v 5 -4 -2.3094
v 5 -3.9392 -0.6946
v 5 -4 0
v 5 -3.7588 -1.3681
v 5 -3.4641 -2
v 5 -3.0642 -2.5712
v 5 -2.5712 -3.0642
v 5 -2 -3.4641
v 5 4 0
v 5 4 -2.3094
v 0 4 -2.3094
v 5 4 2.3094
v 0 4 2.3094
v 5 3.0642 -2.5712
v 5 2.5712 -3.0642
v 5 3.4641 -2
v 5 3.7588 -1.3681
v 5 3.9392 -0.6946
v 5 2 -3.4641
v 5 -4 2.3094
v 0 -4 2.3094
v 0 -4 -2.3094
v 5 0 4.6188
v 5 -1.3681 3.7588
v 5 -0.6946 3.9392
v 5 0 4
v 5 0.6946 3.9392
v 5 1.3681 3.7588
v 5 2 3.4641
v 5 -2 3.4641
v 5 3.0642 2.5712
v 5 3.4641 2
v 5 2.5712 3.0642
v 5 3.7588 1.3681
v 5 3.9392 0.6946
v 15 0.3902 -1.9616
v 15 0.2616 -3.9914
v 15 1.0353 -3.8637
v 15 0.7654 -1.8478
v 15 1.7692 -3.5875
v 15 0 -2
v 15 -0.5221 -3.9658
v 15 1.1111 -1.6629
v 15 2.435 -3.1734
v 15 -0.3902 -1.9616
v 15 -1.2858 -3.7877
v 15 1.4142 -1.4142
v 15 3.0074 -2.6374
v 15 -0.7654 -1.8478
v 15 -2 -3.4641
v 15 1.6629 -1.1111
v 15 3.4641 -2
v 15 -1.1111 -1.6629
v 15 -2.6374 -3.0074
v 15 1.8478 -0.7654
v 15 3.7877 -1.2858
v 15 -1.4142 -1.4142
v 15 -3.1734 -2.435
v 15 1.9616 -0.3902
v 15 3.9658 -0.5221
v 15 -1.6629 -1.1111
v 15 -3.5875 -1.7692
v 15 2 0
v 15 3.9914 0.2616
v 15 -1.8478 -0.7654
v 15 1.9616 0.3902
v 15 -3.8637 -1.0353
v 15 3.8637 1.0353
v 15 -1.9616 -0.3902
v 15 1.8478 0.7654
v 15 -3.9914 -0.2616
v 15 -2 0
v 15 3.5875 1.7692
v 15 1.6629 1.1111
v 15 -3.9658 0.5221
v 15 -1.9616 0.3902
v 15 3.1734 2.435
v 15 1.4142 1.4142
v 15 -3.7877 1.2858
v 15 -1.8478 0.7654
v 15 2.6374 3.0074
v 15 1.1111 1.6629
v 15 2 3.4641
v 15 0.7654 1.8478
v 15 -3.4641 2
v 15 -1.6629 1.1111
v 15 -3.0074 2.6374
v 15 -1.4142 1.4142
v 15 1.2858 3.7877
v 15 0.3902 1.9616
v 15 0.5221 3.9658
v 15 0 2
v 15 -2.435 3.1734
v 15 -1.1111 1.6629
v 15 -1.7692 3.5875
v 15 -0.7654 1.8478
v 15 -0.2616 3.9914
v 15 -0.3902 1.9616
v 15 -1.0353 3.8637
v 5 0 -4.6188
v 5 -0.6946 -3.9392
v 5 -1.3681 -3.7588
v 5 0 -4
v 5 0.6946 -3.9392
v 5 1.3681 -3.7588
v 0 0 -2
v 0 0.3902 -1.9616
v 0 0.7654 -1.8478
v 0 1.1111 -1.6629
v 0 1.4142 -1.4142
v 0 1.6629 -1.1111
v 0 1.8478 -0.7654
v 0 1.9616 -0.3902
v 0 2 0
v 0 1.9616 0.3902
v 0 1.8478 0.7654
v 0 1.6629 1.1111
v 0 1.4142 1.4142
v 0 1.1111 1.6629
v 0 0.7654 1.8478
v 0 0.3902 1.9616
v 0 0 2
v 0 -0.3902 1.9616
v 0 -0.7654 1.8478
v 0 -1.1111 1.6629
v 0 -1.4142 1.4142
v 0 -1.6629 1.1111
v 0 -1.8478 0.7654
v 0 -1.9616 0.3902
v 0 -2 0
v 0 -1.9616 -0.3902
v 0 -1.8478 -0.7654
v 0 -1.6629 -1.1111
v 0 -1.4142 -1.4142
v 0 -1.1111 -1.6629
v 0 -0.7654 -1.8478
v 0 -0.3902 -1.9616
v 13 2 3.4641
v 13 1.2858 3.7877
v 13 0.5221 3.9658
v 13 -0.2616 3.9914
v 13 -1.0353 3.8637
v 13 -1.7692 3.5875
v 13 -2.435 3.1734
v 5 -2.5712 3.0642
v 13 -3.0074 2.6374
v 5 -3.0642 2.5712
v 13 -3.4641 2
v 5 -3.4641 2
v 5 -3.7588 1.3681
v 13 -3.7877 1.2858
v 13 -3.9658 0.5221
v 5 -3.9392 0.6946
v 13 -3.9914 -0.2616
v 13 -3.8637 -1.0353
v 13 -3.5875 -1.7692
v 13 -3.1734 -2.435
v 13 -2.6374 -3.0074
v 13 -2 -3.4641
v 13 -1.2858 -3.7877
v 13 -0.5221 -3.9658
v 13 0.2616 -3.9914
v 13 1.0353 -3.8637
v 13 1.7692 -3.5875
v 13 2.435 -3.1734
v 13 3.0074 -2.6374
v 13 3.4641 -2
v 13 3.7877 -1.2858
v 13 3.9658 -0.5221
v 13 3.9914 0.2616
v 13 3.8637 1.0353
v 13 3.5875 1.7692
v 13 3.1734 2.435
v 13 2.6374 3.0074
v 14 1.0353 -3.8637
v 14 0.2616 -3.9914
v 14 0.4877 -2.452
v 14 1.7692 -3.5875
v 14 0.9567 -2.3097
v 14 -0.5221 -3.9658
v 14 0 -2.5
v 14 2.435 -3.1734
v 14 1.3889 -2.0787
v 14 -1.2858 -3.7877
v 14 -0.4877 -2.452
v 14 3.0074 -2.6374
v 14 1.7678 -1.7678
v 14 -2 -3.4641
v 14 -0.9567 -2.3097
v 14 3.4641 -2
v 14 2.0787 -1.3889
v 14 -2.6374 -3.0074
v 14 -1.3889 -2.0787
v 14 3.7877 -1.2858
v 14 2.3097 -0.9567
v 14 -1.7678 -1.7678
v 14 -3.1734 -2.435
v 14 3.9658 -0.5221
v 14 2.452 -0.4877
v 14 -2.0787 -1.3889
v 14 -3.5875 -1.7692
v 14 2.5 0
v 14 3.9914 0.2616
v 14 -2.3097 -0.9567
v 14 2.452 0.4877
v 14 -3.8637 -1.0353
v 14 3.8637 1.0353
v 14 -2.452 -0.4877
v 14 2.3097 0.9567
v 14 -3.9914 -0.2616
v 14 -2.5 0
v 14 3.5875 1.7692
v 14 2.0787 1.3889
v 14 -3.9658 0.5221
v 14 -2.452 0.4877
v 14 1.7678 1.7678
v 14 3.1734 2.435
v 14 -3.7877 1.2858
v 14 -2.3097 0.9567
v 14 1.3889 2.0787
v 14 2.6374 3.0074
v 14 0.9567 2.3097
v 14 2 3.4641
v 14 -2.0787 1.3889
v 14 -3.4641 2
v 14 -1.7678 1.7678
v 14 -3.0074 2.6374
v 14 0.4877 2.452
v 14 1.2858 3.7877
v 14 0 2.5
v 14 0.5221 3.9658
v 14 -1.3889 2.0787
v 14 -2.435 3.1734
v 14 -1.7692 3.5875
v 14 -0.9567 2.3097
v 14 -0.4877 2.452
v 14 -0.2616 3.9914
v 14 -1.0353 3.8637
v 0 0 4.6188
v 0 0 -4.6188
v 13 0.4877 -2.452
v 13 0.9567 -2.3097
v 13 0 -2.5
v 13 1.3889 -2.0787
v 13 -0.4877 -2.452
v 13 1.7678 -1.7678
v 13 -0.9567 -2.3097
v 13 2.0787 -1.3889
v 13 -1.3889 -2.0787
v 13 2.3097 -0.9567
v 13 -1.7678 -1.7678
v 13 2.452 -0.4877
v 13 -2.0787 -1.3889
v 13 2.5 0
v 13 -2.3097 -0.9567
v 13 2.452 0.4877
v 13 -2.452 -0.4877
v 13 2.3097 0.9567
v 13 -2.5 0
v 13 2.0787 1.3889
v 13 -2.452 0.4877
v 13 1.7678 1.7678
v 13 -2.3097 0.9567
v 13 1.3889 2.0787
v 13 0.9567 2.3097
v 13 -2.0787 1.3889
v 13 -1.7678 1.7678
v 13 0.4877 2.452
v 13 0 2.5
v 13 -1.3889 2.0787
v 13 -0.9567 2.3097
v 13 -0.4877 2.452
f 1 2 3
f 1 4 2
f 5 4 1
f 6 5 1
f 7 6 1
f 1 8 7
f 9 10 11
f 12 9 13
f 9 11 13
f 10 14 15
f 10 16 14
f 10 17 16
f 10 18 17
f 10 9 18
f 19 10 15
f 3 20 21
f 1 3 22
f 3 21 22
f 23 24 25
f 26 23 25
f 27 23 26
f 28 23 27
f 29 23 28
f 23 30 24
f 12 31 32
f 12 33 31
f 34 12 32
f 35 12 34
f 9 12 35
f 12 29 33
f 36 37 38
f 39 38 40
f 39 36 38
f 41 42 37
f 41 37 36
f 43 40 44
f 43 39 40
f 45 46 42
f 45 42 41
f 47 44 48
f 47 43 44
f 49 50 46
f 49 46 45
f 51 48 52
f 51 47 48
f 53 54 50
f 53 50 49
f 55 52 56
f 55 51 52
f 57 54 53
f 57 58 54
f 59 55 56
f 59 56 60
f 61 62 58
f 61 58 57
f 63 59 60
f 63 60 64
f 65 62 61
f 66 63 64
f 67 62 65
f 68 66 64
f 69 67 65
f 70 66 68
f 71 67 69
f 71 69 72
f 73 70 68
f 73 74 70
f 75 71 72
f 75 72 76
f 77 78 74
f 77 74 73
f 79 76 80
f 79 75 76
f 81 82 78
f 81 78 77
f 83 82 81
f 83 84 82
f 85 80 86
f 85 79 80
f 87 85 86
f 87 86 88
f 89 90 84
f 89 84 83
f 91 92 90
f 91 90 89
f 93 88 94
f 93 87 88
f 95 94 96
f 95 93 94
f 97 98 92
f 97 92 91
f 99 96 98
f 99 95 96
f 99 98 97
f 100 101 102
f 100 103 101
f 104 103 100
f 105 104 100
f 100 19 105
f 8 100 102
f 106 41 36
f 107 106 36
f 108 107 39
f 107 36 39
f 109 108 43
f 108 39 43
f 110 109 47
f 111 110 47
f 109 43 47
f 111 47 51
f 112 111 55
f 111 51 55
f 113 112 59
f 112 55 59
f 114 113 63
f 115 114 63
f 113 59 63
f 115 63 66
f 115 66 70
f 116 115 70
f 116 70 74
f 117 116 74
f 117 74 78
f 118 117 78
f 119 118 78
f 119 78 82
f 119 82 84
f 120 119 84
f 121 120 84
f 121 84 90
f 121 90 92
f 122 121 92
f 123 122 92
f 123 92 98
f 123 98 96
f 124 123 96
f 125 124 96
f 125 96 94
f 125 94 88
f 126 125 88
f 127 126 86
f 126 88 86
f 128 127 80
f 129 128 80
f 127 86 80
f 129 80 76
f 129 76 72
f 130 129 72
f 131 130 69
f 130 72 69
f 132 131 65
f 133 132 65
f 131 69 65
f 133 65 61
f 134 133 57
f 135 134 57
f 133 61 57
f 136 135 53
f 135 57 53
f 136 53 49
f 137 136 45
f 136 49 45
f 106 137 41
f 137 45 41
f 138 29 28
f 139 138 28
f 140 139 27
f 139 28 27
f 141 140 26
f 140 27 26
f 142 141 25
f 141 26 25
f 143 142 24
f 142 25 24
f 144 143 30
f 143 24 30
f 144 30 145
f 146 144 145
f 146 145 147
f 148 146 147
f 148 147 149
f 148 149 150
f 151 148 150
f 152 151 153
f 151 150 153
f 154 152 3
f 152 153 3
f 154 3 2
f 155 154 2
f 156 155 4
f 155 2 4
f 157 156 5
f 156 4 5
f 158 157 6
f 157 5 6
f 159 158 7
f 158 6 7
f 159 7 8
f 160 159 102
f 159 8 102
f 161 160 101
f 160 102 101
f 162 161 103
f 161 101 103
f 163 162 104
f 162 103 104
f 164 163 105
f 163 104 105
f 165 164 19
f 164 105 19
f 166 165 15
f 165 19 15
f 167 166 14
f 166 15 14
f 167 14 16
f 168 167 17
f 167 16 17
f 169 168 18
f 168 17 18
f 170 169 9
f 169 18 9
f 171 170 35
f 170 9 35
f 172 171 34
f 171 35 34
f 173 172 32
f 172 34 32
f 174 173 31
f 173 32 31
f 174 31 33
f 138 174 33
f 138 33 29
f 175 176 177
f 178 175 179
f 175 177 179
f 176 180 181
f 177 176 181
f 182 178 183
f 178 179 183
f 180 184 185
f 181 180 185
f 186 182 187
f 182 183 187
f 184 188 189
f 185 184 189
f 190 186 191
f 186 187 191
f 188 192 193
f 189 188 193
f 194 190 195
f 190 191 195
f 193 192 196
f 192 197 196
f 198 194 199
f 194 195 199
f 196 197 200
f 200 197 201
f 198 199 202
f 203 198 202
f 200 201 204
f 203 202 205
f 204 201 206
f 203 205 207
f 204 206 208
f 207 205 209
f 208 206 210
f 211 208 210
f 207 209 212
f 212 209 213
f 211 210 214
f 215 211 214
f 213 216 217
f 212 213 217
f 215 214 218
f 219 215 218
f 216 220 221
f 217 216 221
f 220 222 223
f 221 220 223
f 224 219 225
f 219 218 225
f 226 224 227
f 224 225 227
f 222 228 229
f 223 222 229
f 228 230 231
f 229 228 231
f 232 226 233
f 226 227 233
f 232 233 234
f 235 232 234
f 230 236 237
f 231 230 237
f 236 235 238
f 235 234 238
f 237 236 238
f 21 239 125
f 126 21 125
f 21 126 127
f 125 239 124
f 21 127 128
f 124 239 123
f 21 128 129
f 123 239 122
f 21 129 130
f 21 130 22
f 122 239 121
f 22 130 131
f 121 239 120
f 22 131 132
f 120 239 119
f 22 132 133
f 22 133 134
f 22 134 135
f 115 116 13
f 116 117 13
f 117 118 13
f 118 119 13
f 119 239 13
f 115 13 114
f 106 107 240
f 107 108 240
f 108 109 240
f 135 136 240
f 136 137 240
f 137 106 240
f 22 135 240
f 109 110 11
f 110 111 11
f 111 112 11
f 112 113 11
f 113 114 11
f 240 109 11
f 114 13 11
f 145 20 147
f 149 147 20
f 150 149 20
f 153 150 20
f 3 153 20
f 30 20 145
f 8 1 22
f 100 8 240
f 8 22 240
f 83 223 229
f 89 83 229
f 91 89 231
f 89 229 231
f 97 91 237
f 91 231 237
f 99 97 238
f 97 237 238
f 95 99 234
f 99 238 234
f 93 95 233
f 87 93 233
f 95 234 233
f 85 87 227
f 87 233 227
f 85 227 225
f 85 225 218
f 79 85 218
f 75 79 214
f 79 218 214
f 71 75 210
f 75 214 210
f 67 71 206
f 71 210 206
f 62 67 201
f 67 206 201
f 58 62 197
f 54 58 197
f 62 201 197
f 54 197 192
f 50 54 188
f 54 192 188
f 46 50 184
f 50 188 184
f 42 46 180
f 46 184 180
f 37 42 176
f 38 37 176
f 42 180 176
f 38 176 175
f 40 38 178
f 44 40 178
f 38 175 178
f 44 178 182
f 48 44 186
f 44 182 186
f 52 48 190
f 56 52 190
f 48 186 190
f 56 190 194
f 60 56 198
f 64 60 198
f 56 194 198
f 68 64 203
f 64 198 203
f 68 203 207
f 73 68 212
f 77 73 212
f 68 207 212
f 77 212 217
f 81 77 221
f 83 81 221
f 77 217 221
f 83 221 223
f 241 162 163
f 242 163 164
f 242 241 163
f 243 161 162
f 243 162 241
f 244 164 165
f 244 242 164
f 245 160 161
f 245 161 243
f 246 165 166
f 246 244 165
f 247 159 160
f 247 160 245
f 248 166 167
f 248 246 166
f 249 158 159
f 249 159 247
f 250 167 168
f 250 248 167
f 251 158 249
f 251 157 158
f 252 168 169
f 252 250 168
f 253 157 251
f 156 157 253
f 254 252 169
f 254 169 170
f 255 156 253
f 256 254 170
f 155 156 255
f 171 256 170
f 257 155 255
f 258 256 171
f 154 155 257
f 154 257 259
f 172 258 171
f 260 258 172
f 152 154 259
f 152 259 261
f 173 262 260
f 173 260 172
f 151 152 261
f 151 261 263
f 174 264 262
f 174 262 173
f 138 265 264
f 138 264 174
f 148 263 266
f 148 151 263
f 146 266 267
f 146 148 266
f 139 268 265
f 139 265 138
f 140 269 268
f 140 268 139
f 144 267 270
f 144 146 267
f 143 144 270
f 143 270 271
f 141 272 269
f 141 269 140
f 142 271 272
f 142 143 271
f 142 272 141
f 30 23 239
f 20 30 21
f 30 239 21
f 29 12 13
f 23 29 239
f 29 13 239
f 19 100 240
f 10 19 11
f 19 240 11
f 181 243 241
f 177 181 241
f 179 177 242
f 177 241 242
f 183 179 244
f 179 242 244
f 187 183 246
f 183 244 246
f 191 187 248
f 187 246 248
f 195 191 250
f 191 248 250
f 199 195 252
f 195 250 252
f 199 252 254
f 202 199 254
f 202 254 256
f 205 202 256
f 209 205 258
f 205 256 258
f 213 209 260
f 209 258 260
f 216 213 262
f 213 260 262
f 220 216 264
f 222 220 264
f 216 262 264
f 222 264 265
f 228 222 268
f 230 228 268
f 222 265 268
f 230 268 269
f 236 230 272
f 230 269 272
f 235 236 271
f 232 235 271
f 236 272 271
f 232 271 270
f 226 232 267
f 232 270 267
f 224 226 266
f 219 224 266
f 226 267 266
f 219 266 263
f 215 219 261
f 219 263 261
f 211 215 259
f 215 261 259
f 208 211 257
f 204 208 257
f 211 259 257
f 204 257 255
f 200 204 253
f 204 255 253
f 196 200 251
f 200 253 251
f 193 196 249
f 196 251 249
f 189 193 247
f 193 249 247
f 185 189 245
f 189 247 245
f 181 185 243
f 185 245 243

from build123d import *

# Parameters (mm, degrees)
EXTRUDE_1_DEPTH     = 5
SKETCH_2_R          = 4
EXTRUDE_2_DEPTH     = 8
SKETCH_3_R          = 2.5
EXTRUDE_3_DEPTH     = 1
SKETCH_4_R          = 4
EXTRUDE_4_DEPTH     = 1
SKETCH_5_R          = 2
CUT_EXTRUDE_1_DEPTH = 17.196707484


with BuildPart() as part:
    # 草图1 → 凸台-拉伸1 (new body)
    with BuildSketch(Plane(origin=(0, 0, 0), x_dir=(0, 0, -1), z_dir=(1, 0, 0))):
        Polygon((-2.309401077, 4), (-4.618802154, 0), (-2.309401077, -4), (2.309401077, -4), (4.618802154, 0), (2.309401077, 4), align=None)
    extrude(amount=EXTRUDE_1_DEPTH)

    # 草图2 → 凸台-拉伸2 (add)
    with BuildSketch(Plane(origin=(5, 0, 0), x_dir=(0, 0, -1), z_dir=(1, 0, 0))):
        with Locations(Location((0, 0, 0), (0, 0, 150))):
            Circle(SKETCH_2_R)
    extrude(amount=EXTRUDE_2_DEPTH)

    # 草图3 → 凸台-拉伸3 (add)
    with BuildSketch(Plane(origin=(13, 0, 0), x_dir=(0, 0, -1), z_dir=(1, 0, 0))):
        Circle(SKETCH_3_R)
    extrude(amount=EXTRUDE_3_DEPTH)

    # 草图4 → 凸台-拉伸4 (add)
    with BuildSketch(Plane(origin=(14, 0, 0), x_dir=(0, 0, -1), z_dir=(1, 0, 0))):
        with Locations(Location((0, 0, 0), (0, 0, 150))):
            Circle(SKETCH_4_R)
    extrude(amount=EXTRUDE_4_DEPTH)

    # 草图5 → 切除-拉伸1 (cut, through all)
    with BuildSketch(Plane(origin=(15, 0, 0), x_dir=(0, 0, -1), z_dir=(1, 0, 0))):
        Circle(SKETCH_5_R)
    extrude(amount=-CUT_EXTRUDE_1_DEPTH, mode=Mode.SUBTRACT)


solid = part.part
